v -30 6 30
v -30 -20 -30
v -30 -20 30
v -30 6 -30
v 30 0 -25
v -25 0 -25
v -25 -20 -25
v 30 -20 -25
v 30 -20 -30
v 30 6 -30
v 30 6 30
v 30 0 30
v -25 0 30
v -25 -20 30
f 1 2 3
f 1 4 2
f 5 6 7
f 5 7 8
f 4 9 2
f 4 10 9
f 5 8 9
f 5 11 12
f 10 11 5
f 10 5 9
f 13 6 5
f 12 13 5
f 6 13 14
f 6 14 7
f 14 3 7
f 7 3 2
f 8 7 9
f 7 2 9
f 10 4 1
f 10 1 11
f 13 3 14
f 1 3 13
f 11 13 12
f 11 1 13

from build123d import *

# Parameters (mm, degrees)
SKETCH1_W           = 60
SKETCH1_H           = 60
BOSS_EXTRUDE1_DEPTH = 6
BOSS_EXTRUDE2_DEPTH = 20


with BuildPart() as part:
    # Sketch1 → Boss-Extrude1 (new body)
    with BuildSketch(Plane(origin=(0, 0, 0), x_dir=(1, 0, 0), z_dir=(0, 1, 0))):
        Rectangle(SKETCH1_W, SKETCH1_H)
    extrude(amount=BOSS_EXTRUDE1_DEPTH)

    # Sketch2 → Boss-Extrude2 (add)
    with BuildSketch(Plane(origin=(0, 0, 0), x_dir=(1, 0, 0), z_dir=(0, 1, 0))):
        Polygon((-30, 30), (-30, -30), (-25, -30), (-25, 25), (30, 25), (30, 30), align=None)
    extrude(amount=-BOSS_EXTRUDE2_DEPTH)


solid = part.part
